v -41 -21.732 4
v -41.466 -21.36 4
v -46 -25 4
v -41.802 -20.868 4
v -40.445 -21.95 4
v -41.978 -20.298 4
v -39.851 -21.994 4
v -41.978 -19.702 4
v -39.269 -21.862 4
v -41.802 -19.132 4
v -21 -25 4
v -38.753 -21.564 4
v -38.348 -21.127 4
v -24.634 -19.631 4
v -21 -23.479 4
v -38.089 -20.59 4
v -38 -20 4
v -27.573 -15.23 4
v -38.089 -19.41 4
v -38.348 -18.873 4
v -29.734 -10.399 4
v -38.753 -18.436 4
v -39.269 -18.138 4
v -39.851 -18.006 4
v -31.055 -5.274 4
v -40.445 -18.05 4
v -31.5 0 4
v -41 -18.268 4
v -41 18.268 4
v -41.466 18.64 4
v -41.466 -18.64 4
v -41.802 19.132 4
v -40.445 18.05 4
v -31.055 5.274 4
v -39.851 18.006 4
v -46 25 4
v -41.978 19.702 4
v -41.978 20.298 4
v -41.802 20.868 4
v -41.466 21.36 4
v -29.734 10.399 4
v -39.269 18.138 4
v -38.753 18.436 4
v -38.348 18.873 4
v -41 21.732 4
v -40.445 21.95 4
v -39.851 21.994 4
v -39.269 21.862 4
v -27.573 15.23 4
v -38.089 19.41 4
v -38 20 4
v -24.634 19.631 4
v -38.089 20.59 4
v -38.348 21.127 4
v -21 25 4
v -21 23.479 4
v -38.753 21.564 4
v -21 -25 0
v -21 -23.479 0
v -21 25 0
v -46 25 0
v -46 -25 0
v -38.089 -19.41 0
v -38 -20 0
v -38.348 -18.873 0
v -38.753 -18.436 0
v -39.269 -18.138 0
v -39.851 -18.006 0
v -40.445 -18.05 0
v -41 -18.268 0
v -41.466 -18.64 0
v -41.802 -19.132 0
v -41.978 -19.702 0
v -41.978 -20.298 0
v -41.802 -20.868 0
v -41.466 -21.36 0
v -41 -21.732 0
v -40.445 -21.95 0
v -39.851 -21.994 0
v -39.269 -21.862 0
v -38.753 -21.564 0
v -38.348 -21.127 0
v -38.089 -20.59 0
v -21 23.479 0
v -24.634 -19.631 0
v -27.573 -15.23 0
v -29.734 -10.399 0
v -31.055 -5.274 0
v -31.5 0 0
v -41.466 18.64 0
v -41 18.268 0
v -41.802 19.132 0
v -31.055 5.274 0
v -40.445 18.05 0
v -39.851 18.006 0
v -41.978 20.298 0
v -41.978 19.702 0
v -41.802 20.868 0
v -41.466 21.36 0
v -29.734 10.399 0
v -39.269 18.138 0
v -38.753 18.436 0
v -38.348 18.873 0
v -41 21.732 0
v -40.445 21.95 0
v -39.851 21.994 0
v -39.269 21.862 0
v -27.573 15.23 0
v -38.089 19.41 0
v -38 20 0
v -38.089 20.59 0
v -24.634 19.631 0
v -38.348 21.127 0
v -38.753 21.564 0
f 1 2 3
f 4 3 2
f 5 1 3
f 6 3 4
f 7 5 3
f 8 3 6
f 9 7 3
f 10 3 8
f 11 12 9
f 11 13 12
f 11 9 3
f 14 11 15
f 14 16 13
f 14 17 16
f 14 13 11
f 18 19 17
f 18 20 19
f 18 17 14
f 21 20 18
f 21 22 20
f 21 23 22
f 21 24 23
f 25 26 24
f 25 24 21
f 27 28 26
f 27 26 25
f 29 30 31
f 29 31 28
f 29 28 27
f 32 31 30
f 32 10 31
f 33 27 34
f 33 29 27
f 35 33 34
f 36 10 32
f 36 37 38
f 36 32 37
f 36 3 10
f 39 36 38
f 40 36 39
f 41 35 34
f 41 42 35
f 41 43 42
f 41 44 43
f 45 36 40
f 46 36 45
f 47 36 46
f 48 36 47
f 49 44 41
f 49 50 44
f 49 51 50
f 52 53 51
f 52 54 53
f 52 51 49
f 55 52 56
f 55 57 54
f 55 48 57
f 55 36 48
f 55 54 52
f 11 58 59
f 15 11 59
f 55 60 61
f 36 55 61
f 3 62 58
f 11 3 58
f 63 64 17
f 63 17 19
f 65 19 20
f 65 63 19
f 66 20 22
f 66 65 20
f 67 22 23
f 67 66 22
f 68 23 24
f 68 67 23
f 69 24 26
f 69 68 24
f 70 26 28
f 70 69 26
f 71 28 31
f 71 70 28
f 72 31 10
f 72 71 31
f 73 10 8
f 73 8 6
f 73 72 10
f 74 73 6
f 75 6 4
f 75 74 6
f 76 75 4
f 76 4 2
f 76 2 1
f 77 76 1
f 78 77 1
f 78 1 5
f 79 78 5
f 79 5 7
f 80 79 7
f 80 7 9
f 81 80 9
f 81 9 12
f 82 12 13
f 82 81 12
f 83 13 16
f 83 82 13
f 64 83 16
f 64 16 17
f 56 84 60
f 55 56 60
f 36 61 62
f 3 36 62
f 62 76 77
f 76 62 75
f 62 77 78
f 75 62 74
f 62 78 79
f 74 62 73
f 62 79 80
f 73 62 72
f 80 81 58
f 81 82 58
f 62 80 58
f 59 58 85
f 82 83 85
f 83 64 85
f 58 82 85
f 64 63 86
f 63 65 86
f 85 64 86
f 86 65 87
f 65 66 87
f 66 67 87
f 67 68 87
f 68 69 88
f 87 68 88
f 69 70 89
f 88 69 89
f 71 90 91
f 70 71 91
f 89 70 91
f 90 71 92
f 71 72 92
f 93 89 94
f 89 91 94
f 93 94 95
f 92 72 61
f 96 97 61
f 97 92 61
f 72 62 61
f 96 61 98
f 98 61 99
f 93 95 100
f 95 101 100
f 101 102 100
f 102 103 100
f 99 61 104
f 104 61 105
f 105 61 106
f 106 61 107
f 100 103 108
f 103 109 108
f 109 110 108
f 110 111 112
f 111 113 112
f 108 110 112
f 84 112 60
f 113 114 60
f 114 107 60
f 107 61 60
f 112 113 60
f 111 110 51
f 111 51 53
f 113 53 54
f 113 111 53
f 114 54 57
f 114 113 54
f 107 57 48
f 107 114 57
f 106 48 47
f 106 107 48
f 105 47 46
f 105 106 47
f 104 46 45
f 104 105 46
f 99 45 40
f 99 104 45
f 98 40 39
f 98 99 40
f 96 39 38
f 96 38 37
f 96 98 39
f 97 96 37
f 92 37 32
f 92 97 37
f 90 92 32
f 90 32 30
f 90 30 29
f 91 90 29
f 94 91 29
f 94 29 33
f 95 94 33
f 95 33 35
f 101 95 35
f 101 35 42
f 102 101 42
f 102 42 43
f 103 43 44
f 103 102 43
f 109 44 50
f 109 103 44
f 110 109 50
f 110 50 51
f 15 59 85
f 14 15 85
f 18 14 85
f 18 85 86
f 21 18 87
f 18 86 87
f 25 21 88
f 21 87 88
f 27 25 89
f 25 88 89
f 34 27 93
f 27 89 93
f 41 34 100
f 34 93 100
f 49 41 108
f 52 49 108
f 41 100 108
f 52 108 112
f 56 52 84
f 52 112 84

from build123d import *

# Parameters (mm, degrees)
SKETCH_1_R      = 2
EXTRUDE_1_DEPTH = 4


with BuildPart() as part:
    # 草图1 → 凸台-拉伸1 (new body)
    with BuildSketch(Plane.XY):
        with BuildLine():
            Line((-21, 23.478713764), (-21, 25))
            Line((-21, 25), (-46, 25))
            Line((-46, 25), (-46, -25))
            Line((-46, -25), (-21, -25))
            Line((-21, -25), (-21, -23.478713764))
            ThreePointArc((-21, -23.478713764), (-31.5, 0), (-21, 23.478713764))
        make_face()
        with Locations((-40, 20)):
            Circle(SKETCH_1_R, mode=Mode.SUBTRACT)
        with Locations((-40, -20)):
            Circle(SKETCH_1_R, mode=Mode.SUBTRACT)
    extrude(amount=EXTRUDE_1_DEPTH)


solid = part.part
